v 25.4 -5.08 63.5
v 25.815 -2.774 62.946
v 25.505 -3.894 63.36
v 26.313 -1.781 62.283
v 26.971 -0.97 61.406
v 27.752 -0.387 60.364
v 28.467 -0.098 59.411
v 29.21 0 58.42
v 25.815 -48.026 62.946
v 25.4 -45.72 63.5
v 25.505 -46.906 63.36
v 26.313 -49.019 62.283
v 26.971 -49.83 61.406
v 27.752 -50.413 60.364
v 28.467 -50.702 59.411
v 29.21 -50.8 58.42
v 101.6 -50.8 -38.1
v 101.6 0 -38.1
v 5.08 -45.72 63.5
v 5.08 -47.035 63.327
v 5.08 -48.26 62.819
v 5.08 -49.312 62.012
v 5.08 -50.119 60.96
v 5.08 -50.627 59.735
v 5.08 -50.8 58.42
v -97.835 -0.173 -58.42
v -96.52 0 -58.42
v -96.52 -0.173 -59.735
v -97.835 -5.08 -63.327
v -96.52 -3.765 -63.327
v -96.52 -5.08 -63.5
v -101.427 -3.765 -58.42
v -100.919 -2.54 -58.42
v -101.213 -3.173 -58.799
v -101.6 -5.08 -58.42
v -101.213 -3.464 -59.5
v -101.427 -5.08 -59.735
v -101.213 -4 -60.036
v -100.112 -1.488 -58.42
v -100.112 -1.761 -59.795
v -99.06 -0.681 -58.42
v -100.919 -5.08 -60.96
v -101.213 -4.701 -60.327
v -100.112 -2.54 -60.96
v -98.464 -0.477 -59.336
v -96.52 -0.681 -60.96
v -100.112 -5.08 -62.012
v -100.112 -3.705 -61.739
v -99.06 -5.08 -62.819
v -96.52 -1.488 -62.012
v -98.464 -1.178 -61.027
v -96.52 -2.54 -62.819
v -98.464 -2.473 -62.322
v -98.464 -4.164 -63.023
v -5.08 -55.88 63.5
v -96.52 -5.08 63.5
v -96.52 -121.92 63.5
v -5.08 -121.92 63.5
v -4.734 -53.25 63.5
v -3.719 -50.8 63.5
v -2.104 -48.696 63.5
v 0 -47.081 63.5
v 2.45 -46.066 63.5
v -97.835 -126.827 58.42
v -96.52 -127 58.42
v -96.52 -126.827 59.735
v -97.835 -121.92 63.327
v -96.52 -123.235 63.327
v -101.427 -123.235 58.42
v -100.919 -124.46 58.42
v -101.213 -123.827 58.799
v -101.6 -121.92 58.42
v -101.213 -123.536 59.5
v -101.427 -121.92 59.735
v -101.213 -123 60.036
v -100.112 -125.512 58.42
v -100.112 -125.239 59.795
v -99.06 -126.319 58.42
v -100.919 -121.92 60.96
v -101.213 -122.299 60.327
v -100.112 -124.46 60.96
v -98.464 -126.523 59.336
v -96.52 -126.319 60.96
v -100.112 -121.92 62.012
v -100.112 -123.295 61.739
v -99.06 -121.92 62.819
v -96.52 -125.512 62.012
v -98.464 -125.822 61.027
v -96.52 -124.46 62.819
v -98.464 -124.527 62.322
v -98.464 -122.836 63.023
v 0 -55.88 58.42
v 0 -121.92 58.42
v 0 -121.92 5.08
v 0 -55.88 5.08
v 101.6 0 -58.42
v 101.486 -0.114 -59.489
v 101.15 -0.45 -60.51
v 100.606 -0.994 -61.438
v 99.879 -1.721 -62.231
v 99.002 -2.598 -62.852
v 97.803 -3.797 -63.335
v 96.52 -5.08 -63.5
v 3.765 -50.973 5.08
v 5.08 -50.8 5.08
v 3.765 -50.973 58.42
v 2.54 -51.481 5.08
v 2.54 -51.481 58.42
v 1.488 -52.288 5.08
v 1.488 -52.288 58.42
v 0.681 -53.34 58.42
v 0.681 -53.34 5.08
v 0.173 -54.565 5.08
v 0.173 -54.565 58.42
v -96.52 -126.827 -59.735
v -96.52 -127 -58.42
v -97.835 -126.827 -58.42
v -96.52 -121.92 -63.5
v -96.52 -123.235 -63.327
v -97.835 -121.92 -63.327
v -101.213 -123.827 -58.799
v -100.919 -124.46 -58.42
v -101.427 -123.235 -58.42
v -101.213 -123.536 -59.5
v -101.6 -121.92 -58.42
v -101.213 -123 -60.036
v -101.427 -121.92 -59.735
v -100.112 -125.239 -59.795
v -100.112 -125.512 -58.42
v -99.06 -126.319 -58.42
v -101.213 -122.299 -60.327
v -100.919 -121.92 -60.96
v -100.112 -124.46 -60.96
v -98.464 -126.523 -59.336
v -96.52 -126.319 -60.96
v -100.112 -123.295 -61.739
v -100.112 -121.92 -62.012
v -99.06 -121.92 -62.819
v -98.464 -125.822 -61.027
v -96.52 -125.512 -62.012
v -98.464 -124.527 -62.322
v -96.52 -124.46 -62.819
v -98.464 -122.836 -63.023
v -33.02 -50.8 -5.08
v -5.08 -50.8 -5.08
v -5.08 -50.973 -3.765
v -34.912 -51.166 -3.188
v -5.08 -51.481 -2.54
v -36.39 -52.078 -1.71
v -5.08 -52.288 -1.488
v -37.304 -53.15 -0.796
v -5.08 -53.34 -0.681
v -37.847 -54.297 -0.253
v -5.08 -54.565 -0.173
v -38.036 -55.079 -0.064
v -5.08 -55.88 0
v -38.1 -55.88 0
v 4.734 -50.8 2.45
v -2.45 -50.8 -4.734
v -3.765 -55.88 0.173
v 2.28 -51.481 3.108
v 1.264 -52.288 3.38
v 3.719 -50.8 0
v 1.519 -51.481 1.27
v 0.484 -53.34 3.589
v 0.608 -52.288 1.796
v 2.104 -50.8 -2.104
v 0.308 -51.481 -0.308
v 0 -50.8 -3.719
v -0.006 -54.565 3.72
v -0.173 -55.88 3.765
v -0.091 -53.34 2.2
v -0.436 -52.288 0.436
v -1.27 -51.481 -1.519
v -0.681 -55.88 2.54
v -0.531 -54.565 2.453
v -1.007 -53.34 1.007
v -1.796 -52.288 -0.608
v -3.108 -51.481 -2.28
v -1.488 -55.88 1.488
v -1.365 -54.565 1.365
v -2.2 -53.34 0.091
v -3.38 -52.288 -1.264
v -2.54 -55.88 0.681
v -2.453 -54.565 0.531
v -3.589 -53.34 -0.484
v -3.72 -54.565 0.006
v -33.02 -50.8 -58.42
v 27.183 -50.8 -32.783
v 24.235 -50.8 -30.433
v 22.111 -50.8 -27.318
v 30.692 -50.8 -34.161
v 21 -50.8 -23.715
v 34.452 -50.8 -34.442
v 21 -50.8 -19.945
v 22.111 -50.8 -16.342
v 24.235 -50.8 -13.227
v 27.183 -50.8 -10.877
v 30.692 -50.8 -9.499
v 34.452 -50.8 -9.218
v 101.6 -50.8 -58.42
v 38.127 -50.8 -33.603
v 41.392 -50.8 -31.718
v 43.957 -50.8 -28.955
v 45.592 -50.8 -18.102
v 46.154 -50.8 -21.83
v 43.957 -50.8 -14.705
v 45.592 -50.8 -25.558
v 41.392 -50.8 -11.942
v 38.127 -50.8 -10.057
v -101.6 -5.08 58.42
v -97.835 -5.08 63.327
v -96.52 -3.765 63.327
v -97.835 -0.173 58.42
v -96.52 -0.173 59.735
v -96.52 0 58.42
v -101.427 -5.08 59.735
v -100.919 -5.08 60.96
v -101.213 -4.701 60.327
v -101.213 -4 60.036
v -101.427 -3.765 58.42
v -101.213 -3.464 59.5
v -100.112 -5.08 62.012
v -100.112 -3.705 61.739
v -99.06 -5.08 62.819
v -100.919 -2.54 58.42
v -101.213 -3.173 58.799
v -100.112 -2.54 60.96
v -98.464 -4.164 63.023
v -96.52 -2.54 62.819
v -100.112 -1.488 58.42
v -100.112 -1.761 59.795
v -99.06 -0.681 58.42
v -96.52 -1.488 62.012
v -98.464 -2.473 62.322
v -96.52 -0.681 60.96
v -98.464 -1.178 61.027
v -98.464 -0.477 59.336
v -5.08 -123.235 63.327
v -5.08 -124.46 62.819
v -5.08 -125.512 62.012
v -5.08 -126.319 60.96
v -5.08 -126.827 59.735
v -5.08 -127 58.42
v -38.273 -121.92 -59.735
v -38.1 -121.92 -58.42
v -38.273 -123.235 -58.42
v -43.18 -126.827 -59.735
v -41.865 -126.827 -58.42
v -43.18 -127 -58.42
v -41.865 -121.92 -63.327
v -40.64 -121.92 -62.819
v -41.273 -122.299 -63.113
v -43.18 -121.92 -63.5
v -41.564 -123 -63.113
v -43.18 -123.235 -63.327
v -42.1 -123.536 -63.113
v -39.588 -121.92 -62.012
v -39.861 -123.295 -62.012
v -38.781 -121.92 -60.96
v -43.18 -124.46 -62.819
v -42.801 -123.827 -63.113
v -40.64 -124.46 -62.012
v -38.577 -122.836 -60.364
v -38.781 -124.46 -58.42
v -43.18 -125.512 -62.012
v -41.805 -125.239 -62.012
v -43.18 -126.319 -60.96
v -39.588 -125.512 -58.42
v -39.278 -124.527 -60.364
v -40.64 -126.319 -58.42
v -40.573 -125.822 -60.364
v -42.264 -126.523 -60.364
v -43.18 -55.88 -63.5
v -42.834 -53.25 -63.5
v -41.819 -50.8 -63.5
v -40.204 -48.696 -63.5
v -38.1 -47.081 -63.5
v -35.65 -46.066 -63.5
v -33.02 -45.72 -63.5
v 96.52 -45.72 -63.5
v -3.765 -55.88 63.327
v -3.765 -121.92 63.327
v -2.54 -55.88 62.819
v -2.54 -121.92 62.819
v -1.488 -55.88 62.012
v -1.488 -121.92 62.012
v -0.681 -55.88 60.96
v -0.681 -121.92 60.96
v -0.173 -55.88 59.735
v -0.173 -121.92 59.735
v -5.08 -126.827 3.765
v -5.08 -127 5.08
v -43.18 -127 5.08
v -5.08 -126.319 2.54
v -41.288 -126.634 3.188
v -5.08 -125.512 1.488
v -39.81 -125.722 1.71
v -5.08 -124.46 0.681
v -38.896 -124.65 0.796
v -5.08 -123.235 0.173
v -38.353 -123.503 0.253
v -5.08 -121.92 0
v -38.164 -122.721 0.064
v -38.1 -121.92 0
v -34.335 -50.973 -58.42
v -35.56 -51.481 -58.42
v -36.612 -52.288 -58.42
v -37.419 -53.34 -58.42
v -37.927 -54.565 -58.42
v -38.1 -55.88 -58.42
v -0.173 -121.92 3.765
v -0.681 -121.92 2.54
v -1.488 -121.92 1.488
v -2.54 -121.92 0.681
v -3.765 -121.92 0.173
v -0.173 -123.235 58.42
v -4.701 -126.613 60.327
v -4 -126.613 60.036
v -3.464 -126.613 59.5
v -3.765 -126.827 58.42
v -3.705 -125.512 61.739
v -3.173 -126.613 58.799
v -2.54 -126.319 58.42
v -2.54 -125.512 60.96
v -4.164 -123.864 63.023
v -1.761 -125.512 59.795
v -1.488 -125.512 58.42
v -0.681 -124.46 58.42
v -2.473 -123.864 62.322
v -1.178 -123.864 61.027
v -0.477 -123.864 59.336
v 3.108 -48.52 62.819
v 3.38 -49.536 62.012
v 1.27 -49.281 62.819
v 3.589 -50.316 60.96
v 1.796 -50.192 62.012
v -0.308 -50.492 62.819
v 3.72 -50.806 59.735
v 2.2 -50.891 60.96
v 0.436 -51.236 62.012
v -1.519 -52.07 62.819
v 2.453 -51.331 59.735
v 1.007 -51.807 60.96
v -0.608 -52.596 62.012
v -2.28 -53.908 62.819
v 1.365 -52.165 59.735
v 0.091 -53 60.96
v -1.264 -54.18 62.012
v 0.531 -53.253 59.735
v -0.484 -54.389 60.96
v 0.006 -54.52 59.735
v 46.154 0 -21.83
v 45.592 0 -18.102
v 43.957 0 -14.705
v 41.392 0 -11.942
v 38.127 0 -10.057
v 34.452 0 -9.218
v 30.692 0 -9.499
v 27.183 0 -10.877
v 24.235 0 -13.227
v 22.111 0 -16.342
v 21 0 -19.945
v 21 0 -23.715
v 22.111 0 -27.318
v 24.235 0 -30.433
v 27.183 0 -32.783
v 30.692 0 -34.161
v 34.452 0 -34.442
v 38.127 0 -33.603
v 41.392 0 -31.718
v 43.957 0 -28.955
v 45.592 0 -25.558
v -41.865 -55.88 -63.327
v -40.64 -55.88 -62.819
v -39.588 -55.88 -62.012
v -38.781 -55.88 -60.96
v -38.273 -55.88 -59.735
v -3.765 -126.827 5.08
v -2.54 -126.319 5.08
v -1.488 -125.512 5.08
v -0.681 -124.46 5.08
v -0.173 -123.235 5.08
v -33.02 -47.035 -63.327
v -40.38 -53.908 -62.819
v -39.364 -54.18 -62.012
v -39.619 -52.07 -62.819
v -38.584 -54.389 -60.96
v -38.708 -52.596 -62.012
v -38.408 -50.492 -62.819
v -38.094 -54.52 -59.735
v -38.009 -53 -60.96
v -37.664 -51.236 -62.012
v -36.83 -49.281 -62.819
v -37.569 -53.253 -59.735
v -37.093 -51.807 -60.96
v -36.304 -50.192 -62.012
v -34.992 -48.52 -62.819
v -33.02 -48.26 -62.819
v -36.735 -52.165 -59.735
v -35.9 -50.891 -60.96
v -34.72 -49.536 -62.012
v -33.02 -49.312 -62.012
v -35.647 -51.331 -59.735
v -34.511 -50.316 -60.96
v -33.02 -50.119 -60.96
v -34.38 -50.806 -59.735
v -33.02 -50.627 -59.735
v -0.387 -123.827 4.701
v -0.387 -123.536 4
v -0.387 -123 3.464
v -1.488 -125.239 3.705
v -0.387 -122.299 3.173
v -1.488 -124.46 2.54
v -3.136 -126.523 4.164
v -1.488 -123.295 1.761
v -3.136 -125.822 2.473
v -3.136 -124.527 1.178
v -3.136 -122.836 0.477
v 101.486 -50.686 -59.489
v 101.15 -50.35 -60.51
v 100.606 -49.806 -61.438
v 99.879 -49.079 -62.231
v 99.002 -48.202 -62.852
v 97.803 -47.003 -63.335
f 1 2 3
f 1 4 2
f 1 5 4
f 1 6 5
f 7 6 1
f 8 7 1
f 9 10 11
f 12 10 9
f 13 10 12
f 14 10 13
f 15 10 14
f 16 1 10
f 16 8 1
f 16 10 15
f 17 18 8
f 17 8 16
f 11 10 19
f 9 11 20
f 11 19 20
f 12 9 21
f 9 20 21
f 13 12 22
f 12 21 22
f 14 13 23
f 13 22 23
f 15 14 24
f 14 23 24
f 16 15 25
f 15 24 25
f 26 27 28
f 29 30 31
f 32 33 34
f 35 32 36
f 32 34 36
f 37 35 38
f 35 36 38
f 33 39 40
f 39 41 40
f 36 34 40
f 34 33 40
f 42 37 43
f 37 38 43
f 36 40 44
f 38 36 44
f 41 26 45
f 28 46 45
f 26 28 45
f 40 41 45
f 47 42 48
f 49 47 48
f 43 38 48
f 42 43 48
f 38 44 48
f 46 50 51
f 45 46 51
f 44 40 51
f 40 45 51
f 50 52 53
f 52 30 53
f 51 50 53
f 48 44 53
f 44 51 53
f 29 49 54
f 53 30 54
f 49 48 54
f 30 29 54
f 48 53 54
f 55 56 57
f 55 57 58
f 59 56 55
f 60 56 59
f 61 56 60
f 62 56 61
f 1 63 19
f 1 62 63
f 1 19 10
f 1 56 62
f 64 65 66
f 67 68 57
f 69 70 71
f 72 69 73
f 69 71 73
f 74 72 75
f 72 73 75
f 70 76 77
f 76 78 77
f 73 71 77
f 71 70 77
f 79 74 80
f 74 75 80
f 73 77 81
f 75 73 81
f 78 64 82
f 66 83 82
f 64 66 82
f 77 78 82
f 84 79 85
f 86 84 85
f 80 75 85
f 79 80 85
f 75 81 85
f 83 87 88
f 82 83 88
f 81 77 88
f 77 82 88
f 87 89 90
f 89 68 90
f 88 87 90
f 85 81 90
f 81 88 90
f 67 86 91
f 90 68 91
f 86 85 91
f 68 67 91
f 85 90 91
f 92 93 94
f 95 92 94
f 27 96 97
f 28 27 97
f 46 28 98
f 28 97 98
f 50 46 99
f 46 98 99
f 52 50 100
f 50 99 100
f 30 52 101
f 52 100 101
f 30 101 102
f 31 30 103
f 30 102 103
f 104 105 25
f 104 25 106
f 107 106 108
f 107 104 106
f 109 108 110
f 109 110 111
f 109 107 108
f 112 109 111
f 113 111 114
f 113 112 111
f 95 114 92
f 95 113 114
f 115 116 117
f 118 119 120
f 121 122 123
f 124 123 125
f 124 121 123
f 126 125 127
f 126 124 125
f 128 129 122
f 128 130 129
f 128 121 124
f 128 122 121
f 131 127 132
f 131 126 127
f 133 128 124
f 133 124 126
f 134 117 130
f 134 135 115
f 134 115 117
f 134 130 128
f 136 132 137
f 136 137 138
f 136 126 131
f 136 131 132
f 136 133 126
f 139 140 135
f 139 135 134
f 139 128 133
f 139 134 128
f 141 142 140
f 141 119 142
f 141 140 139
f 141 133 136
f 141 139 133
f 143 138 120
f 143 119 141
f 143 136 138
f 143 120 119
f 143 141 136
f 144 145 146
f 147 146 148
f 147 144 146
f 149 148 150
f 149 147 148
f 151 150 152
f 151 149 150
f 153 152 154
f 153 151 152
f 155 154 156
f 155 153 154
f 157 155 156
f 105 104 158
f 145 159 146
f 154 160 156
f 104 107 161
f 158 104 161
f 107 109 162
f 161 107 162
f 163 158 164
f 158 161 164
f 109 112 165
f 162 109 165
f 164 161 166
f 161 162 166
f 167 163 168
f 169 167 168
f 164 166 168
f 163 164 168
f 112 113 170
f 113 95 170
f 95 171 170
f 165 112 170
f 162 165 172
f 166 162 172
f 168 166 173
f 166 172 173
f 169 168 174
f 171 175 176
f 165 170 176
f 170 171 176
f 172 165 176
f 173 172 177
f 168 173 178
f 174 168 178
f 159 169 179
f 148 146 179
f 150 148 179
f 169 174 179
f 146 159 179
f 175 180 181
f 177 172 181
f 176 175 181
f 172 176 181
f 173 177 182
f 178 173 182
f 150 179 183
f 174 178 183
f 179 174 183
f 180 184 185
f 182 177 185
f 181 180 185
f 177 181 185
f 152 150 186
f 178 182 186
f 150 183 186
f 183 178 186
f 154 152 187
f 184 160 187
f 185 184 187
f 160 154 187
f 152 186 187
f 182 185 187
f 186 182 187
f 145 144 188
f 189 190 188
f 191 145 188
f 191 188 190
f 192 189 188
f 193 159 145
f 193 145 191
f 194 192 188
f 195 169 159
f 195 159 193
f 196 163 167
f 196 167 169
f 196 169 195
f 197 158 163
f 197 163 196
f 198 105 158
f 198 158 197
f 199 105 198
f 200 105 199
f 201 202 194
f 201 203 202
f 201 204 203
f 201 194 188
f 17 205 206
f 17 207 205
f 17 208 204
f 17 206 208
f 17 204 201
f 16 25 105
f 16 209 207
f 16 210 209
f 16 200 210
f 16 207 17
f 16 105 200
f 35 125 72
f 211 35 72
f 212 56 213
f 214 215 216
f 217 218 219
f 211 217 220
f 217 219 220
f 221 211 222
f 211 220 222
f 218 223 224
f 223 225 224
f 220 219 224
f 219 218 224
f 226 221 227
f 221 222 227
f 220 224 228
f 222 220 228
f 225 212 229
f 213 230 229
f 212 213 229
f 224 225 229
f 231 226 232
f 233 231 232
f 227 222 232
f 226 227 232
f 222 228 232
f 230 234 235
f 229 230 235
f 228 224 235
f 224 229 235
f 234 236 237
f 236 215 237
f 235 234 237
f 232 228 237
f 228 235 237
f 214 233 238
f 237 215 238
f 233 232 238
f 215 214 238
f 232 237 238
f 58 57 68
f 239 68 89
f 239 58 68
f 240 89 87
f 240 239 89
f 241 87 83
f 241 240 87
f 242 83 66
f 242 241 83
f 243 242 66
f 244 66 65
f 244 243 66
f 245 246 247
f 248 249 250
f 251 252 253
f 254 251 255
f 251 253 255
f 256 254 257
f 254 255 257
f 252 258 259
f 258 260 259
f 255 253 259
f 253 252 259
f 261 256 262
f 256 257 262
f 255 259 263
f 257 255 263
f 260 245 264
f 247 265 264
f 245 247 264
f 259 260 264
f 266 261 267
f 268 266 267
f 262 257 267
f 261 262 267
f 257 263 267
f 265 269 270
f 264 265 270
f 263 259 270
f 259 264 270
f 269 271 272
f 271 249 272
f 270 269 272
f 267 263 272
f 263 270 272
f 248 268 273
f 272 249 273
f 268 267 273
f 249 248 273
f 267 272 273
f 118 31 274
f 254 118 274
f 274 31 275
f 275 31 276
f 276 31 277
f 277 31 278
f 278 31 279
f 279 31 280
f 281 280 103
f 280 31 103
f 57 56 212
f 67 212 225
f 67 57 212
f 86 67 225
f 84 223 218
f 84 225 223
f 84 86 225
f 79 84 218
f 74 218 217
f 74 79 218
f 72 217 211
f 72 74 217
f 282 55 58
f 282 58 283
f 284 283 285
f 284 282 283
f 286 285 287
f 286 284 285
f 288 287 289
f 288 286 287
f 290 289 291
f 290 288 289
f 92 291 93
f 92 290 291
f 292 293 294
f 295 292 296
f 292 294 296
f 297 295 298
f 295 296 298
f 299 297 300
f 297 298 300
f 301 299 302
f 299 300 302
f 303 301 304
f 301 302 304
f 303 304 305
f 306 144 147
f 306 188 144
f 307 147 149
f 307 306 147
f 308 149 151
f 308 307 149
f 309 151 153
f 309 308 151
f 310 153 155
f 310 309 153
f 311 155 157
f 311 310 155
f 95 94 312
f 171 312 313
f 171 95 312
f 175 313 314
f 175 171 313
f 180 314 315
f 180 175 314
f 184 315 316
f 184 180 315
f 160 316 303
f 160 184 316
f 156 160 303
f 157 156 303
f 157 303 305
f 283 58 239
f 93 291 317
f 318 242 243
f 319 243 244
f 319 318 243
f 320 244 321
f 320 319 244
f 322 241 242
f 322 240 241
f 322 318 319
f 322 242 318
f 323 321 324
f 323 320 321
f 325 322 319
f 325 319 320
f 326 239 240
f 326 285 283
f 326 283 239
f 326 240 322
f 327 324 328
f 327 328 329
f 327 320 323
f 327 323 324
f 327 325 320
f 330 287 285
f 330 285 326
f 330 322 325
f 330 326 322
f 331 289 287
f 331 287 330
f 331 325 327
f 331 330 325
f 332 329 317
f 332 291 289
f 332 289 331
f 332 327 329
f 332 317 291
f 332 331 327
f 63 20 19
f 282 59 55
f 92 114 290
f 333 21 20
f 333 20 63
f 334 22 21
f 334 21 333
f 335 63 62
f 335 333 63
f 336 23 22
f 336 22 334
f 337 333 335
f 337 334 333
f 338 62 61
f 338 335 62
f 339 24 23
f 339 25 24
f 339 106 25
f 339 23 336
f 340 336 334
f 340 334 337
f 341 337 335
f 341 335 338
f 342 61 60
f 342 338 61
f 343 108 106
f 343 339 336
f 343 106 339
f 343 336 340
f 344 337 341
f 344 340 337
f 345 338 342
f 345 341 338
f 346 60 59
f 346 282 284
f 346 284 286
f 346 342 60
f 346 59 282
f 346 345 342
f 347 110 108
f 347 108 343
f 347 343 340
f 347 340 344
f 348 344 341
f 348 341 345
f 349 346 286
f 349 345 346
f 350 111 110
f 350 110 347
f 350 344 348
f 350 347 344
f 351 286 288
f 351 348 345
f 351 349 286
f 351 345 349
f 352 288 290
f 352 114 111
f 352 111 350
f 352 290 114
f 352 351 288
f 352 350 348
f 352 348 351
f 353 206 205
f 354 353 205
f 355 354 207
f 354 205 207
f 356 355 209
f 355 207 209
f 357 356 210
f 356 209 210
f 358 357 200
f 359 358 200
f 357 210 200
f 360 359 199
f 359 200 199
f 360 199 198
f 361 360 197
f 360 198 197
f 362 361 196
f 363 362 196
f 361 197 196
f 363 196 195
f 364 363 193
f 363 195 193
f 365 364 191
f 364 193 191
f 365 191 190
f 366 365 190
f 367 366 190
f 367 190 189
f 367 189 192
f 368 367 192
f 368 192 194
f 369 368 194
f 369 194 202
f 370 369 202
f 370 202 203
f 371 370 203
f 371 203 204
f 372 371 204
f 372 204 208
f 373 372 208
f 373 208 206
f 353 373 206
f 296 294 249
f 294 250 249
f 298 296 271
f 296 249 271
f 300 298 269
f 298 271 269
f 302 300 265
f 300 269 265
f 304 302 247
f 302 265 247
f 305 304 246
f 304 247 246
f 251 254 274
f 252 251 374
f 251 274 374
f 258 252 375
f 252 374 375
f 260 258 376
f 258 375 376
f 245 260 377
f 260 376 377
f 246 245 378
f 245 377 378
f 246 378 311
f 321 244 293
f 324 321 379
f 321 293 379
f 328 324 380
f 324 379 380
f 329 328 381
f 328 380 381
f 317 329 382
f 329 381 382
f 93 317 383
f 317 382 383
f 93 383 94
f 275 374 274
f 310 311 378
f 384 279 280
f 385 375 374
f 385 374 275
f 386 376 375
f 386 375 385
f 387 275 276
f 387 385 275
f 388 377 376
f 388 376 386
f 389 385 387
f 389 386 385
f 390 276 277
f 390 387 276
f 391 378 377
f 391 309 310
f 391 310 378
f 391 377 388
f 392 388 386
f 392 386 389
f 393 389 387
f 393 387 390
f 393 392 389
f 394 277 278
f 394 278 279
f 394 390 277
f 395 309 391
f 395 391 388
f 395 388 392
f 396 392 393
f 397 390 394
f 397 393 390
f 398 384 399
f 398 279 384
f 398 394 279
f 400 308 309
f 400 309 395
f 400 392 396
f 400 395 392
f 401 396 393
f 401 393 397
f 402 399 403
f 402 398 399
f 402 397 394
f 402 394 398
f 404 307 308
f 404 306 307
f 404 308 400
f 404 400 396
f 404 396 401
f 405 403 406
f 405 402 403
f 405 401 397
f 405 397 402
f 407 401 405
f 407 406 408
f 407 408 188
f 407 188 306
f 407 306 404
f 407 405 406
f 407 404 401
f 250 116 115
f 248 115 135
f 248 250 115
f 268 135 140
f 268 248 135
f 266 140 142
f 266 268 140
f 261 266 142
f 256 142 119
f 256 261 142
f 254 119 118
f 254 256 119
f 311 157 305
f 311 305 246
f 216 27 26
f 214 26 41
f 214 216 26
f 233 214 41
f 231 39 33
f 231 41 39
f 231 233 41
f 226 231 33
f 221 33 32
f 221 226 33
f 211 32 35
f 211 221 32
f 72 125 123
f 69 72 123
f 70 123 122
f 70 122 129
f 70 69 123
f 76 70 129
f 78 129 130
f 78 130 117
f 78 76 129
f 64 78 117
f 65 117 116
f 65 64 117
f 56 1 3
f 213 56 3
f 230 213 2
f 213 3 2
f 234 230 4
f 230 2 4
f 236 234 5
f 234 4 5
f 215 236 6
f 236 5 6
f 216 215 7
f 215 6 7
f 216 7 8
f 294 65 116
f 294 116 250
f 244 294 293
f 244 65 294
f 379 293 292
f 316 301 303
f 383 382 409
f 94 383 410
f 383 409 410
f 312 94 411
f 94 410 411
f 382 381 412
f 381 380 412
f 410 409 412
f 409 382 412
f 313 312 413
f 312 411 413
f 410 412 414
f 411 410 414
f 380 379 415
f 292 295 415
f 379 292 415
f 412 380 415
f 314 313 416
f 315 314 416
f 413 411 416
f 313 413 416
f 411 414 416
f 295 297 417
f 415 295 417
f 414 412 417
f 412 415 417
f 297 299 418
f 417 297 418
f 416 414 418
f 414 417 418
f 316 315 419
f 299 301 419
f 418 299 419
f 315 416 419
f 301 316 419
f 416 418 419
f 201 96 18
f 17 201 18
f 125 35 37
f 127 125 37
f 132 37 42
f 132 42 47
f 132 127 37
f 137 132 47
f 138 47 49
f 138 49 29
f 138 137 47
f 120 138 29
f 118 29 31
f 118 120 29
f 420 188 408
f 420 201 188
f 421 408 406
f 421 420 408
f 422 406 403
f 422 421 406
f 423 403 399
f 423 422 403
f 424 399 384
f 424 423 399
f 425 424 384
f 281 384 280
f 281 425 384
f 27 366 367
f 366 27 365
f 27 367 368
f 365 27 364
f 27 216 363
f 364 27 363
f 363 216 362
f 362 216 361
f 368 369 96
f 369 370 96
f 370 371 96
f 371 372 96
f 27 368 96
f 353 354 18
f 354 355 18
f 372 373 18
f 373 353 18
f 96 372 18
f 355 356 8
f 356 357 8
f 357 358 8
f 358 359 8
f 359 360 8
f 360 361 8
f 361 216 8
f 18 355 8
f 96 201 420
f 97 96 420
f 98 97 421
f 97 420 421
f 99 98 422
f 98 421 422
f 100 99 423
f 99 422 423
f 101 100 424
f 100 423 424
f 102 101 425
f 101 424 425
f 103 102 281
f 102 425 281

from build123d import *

# Parameters (mm, degrees)
F0_W     = 203.2
F0_H     = 127
F1_DEPTH = 127
F3_DEPTH = 76.2
F4_SIZE2 = 101.6
F4_SIZE  = 76.2
F5_R     = 5.08
F6_R     = 12.6476198181
F7_DEPTH = 78.486


with BuildPart() as f1:
    # F0 (on Front) → F1 (new body)
    with BuildSketch(Plane.XZ):
        Rectangle(F0_W, F0_H)
    extrude(amount=F1_DEPTH)

    # F2 (on face) → F3 (cut)
    with BuildSketch(Plane.XZ.offset(127)):
        Polygon((101.6, 63.5), (0, 63.5), (0, 0), (-38.1, 0), (-38.1, -63.5), (101.6, -63.5), align=None)
    extrude(amount=-F3_DEPTH, mode=Mode.SUBTRACT)

    # F4
    f4_edges = [f1.edges().sort_by_distance(p)[0] for p in [
        (101.6, -25.4, 63.5),
    ]]
    f4_side = f1.faces().sort_by_distance((-21.771429, -52.614286, 63.5))[0]
    chamfer(f4_edges, length=F4_SIZE, length2=F4_SIZE2, reference=f4_side)

    # F5
    f5_edges = [f1.edges().sort_by_distance(p)[0] for p in [
        (0, -88.9, 63.5),
        (-50.8, -127, 63.5),
        (-19.05, -127, 0),
        (0, -127, 31.75),
        (0, -88.9, 0),
        (-38.1, -127, -31.75),
        (-38.1, -88.9, -63.5),
        (-69.85, -127, -63.5),
        (0, -50.8, 31.75),
        (31.75, -50.8, -63.5),
        (-38.1, -50.8, -31.75),
        (0, 0, -63.5),
        (-38.1, 0, 63.5),
        (-101.6, -127, 0),
        (-101.6, -63.5, 63.5),
        (-101.6, 0, 0),
        (101.6, -25.4, -63.5),
        (-101.6, -63.5, -63.5),
        (12.7, -50.8, 63.5),
        (-19.05, -50.8, 0),
    ]]
    fillet(f5_edges, radius=F5_R)

    # F6 (on face) → F7 (cut)
    with BuildSketch(Plane.XZ.offset(50.8)):
        with Locations((33.5065871477, -21.8299999833)):
            Circle(F6_R)
    extrude(amount=-F7_DEPTH, mode=Mode.SUBTRACT)


solid = f1.part
